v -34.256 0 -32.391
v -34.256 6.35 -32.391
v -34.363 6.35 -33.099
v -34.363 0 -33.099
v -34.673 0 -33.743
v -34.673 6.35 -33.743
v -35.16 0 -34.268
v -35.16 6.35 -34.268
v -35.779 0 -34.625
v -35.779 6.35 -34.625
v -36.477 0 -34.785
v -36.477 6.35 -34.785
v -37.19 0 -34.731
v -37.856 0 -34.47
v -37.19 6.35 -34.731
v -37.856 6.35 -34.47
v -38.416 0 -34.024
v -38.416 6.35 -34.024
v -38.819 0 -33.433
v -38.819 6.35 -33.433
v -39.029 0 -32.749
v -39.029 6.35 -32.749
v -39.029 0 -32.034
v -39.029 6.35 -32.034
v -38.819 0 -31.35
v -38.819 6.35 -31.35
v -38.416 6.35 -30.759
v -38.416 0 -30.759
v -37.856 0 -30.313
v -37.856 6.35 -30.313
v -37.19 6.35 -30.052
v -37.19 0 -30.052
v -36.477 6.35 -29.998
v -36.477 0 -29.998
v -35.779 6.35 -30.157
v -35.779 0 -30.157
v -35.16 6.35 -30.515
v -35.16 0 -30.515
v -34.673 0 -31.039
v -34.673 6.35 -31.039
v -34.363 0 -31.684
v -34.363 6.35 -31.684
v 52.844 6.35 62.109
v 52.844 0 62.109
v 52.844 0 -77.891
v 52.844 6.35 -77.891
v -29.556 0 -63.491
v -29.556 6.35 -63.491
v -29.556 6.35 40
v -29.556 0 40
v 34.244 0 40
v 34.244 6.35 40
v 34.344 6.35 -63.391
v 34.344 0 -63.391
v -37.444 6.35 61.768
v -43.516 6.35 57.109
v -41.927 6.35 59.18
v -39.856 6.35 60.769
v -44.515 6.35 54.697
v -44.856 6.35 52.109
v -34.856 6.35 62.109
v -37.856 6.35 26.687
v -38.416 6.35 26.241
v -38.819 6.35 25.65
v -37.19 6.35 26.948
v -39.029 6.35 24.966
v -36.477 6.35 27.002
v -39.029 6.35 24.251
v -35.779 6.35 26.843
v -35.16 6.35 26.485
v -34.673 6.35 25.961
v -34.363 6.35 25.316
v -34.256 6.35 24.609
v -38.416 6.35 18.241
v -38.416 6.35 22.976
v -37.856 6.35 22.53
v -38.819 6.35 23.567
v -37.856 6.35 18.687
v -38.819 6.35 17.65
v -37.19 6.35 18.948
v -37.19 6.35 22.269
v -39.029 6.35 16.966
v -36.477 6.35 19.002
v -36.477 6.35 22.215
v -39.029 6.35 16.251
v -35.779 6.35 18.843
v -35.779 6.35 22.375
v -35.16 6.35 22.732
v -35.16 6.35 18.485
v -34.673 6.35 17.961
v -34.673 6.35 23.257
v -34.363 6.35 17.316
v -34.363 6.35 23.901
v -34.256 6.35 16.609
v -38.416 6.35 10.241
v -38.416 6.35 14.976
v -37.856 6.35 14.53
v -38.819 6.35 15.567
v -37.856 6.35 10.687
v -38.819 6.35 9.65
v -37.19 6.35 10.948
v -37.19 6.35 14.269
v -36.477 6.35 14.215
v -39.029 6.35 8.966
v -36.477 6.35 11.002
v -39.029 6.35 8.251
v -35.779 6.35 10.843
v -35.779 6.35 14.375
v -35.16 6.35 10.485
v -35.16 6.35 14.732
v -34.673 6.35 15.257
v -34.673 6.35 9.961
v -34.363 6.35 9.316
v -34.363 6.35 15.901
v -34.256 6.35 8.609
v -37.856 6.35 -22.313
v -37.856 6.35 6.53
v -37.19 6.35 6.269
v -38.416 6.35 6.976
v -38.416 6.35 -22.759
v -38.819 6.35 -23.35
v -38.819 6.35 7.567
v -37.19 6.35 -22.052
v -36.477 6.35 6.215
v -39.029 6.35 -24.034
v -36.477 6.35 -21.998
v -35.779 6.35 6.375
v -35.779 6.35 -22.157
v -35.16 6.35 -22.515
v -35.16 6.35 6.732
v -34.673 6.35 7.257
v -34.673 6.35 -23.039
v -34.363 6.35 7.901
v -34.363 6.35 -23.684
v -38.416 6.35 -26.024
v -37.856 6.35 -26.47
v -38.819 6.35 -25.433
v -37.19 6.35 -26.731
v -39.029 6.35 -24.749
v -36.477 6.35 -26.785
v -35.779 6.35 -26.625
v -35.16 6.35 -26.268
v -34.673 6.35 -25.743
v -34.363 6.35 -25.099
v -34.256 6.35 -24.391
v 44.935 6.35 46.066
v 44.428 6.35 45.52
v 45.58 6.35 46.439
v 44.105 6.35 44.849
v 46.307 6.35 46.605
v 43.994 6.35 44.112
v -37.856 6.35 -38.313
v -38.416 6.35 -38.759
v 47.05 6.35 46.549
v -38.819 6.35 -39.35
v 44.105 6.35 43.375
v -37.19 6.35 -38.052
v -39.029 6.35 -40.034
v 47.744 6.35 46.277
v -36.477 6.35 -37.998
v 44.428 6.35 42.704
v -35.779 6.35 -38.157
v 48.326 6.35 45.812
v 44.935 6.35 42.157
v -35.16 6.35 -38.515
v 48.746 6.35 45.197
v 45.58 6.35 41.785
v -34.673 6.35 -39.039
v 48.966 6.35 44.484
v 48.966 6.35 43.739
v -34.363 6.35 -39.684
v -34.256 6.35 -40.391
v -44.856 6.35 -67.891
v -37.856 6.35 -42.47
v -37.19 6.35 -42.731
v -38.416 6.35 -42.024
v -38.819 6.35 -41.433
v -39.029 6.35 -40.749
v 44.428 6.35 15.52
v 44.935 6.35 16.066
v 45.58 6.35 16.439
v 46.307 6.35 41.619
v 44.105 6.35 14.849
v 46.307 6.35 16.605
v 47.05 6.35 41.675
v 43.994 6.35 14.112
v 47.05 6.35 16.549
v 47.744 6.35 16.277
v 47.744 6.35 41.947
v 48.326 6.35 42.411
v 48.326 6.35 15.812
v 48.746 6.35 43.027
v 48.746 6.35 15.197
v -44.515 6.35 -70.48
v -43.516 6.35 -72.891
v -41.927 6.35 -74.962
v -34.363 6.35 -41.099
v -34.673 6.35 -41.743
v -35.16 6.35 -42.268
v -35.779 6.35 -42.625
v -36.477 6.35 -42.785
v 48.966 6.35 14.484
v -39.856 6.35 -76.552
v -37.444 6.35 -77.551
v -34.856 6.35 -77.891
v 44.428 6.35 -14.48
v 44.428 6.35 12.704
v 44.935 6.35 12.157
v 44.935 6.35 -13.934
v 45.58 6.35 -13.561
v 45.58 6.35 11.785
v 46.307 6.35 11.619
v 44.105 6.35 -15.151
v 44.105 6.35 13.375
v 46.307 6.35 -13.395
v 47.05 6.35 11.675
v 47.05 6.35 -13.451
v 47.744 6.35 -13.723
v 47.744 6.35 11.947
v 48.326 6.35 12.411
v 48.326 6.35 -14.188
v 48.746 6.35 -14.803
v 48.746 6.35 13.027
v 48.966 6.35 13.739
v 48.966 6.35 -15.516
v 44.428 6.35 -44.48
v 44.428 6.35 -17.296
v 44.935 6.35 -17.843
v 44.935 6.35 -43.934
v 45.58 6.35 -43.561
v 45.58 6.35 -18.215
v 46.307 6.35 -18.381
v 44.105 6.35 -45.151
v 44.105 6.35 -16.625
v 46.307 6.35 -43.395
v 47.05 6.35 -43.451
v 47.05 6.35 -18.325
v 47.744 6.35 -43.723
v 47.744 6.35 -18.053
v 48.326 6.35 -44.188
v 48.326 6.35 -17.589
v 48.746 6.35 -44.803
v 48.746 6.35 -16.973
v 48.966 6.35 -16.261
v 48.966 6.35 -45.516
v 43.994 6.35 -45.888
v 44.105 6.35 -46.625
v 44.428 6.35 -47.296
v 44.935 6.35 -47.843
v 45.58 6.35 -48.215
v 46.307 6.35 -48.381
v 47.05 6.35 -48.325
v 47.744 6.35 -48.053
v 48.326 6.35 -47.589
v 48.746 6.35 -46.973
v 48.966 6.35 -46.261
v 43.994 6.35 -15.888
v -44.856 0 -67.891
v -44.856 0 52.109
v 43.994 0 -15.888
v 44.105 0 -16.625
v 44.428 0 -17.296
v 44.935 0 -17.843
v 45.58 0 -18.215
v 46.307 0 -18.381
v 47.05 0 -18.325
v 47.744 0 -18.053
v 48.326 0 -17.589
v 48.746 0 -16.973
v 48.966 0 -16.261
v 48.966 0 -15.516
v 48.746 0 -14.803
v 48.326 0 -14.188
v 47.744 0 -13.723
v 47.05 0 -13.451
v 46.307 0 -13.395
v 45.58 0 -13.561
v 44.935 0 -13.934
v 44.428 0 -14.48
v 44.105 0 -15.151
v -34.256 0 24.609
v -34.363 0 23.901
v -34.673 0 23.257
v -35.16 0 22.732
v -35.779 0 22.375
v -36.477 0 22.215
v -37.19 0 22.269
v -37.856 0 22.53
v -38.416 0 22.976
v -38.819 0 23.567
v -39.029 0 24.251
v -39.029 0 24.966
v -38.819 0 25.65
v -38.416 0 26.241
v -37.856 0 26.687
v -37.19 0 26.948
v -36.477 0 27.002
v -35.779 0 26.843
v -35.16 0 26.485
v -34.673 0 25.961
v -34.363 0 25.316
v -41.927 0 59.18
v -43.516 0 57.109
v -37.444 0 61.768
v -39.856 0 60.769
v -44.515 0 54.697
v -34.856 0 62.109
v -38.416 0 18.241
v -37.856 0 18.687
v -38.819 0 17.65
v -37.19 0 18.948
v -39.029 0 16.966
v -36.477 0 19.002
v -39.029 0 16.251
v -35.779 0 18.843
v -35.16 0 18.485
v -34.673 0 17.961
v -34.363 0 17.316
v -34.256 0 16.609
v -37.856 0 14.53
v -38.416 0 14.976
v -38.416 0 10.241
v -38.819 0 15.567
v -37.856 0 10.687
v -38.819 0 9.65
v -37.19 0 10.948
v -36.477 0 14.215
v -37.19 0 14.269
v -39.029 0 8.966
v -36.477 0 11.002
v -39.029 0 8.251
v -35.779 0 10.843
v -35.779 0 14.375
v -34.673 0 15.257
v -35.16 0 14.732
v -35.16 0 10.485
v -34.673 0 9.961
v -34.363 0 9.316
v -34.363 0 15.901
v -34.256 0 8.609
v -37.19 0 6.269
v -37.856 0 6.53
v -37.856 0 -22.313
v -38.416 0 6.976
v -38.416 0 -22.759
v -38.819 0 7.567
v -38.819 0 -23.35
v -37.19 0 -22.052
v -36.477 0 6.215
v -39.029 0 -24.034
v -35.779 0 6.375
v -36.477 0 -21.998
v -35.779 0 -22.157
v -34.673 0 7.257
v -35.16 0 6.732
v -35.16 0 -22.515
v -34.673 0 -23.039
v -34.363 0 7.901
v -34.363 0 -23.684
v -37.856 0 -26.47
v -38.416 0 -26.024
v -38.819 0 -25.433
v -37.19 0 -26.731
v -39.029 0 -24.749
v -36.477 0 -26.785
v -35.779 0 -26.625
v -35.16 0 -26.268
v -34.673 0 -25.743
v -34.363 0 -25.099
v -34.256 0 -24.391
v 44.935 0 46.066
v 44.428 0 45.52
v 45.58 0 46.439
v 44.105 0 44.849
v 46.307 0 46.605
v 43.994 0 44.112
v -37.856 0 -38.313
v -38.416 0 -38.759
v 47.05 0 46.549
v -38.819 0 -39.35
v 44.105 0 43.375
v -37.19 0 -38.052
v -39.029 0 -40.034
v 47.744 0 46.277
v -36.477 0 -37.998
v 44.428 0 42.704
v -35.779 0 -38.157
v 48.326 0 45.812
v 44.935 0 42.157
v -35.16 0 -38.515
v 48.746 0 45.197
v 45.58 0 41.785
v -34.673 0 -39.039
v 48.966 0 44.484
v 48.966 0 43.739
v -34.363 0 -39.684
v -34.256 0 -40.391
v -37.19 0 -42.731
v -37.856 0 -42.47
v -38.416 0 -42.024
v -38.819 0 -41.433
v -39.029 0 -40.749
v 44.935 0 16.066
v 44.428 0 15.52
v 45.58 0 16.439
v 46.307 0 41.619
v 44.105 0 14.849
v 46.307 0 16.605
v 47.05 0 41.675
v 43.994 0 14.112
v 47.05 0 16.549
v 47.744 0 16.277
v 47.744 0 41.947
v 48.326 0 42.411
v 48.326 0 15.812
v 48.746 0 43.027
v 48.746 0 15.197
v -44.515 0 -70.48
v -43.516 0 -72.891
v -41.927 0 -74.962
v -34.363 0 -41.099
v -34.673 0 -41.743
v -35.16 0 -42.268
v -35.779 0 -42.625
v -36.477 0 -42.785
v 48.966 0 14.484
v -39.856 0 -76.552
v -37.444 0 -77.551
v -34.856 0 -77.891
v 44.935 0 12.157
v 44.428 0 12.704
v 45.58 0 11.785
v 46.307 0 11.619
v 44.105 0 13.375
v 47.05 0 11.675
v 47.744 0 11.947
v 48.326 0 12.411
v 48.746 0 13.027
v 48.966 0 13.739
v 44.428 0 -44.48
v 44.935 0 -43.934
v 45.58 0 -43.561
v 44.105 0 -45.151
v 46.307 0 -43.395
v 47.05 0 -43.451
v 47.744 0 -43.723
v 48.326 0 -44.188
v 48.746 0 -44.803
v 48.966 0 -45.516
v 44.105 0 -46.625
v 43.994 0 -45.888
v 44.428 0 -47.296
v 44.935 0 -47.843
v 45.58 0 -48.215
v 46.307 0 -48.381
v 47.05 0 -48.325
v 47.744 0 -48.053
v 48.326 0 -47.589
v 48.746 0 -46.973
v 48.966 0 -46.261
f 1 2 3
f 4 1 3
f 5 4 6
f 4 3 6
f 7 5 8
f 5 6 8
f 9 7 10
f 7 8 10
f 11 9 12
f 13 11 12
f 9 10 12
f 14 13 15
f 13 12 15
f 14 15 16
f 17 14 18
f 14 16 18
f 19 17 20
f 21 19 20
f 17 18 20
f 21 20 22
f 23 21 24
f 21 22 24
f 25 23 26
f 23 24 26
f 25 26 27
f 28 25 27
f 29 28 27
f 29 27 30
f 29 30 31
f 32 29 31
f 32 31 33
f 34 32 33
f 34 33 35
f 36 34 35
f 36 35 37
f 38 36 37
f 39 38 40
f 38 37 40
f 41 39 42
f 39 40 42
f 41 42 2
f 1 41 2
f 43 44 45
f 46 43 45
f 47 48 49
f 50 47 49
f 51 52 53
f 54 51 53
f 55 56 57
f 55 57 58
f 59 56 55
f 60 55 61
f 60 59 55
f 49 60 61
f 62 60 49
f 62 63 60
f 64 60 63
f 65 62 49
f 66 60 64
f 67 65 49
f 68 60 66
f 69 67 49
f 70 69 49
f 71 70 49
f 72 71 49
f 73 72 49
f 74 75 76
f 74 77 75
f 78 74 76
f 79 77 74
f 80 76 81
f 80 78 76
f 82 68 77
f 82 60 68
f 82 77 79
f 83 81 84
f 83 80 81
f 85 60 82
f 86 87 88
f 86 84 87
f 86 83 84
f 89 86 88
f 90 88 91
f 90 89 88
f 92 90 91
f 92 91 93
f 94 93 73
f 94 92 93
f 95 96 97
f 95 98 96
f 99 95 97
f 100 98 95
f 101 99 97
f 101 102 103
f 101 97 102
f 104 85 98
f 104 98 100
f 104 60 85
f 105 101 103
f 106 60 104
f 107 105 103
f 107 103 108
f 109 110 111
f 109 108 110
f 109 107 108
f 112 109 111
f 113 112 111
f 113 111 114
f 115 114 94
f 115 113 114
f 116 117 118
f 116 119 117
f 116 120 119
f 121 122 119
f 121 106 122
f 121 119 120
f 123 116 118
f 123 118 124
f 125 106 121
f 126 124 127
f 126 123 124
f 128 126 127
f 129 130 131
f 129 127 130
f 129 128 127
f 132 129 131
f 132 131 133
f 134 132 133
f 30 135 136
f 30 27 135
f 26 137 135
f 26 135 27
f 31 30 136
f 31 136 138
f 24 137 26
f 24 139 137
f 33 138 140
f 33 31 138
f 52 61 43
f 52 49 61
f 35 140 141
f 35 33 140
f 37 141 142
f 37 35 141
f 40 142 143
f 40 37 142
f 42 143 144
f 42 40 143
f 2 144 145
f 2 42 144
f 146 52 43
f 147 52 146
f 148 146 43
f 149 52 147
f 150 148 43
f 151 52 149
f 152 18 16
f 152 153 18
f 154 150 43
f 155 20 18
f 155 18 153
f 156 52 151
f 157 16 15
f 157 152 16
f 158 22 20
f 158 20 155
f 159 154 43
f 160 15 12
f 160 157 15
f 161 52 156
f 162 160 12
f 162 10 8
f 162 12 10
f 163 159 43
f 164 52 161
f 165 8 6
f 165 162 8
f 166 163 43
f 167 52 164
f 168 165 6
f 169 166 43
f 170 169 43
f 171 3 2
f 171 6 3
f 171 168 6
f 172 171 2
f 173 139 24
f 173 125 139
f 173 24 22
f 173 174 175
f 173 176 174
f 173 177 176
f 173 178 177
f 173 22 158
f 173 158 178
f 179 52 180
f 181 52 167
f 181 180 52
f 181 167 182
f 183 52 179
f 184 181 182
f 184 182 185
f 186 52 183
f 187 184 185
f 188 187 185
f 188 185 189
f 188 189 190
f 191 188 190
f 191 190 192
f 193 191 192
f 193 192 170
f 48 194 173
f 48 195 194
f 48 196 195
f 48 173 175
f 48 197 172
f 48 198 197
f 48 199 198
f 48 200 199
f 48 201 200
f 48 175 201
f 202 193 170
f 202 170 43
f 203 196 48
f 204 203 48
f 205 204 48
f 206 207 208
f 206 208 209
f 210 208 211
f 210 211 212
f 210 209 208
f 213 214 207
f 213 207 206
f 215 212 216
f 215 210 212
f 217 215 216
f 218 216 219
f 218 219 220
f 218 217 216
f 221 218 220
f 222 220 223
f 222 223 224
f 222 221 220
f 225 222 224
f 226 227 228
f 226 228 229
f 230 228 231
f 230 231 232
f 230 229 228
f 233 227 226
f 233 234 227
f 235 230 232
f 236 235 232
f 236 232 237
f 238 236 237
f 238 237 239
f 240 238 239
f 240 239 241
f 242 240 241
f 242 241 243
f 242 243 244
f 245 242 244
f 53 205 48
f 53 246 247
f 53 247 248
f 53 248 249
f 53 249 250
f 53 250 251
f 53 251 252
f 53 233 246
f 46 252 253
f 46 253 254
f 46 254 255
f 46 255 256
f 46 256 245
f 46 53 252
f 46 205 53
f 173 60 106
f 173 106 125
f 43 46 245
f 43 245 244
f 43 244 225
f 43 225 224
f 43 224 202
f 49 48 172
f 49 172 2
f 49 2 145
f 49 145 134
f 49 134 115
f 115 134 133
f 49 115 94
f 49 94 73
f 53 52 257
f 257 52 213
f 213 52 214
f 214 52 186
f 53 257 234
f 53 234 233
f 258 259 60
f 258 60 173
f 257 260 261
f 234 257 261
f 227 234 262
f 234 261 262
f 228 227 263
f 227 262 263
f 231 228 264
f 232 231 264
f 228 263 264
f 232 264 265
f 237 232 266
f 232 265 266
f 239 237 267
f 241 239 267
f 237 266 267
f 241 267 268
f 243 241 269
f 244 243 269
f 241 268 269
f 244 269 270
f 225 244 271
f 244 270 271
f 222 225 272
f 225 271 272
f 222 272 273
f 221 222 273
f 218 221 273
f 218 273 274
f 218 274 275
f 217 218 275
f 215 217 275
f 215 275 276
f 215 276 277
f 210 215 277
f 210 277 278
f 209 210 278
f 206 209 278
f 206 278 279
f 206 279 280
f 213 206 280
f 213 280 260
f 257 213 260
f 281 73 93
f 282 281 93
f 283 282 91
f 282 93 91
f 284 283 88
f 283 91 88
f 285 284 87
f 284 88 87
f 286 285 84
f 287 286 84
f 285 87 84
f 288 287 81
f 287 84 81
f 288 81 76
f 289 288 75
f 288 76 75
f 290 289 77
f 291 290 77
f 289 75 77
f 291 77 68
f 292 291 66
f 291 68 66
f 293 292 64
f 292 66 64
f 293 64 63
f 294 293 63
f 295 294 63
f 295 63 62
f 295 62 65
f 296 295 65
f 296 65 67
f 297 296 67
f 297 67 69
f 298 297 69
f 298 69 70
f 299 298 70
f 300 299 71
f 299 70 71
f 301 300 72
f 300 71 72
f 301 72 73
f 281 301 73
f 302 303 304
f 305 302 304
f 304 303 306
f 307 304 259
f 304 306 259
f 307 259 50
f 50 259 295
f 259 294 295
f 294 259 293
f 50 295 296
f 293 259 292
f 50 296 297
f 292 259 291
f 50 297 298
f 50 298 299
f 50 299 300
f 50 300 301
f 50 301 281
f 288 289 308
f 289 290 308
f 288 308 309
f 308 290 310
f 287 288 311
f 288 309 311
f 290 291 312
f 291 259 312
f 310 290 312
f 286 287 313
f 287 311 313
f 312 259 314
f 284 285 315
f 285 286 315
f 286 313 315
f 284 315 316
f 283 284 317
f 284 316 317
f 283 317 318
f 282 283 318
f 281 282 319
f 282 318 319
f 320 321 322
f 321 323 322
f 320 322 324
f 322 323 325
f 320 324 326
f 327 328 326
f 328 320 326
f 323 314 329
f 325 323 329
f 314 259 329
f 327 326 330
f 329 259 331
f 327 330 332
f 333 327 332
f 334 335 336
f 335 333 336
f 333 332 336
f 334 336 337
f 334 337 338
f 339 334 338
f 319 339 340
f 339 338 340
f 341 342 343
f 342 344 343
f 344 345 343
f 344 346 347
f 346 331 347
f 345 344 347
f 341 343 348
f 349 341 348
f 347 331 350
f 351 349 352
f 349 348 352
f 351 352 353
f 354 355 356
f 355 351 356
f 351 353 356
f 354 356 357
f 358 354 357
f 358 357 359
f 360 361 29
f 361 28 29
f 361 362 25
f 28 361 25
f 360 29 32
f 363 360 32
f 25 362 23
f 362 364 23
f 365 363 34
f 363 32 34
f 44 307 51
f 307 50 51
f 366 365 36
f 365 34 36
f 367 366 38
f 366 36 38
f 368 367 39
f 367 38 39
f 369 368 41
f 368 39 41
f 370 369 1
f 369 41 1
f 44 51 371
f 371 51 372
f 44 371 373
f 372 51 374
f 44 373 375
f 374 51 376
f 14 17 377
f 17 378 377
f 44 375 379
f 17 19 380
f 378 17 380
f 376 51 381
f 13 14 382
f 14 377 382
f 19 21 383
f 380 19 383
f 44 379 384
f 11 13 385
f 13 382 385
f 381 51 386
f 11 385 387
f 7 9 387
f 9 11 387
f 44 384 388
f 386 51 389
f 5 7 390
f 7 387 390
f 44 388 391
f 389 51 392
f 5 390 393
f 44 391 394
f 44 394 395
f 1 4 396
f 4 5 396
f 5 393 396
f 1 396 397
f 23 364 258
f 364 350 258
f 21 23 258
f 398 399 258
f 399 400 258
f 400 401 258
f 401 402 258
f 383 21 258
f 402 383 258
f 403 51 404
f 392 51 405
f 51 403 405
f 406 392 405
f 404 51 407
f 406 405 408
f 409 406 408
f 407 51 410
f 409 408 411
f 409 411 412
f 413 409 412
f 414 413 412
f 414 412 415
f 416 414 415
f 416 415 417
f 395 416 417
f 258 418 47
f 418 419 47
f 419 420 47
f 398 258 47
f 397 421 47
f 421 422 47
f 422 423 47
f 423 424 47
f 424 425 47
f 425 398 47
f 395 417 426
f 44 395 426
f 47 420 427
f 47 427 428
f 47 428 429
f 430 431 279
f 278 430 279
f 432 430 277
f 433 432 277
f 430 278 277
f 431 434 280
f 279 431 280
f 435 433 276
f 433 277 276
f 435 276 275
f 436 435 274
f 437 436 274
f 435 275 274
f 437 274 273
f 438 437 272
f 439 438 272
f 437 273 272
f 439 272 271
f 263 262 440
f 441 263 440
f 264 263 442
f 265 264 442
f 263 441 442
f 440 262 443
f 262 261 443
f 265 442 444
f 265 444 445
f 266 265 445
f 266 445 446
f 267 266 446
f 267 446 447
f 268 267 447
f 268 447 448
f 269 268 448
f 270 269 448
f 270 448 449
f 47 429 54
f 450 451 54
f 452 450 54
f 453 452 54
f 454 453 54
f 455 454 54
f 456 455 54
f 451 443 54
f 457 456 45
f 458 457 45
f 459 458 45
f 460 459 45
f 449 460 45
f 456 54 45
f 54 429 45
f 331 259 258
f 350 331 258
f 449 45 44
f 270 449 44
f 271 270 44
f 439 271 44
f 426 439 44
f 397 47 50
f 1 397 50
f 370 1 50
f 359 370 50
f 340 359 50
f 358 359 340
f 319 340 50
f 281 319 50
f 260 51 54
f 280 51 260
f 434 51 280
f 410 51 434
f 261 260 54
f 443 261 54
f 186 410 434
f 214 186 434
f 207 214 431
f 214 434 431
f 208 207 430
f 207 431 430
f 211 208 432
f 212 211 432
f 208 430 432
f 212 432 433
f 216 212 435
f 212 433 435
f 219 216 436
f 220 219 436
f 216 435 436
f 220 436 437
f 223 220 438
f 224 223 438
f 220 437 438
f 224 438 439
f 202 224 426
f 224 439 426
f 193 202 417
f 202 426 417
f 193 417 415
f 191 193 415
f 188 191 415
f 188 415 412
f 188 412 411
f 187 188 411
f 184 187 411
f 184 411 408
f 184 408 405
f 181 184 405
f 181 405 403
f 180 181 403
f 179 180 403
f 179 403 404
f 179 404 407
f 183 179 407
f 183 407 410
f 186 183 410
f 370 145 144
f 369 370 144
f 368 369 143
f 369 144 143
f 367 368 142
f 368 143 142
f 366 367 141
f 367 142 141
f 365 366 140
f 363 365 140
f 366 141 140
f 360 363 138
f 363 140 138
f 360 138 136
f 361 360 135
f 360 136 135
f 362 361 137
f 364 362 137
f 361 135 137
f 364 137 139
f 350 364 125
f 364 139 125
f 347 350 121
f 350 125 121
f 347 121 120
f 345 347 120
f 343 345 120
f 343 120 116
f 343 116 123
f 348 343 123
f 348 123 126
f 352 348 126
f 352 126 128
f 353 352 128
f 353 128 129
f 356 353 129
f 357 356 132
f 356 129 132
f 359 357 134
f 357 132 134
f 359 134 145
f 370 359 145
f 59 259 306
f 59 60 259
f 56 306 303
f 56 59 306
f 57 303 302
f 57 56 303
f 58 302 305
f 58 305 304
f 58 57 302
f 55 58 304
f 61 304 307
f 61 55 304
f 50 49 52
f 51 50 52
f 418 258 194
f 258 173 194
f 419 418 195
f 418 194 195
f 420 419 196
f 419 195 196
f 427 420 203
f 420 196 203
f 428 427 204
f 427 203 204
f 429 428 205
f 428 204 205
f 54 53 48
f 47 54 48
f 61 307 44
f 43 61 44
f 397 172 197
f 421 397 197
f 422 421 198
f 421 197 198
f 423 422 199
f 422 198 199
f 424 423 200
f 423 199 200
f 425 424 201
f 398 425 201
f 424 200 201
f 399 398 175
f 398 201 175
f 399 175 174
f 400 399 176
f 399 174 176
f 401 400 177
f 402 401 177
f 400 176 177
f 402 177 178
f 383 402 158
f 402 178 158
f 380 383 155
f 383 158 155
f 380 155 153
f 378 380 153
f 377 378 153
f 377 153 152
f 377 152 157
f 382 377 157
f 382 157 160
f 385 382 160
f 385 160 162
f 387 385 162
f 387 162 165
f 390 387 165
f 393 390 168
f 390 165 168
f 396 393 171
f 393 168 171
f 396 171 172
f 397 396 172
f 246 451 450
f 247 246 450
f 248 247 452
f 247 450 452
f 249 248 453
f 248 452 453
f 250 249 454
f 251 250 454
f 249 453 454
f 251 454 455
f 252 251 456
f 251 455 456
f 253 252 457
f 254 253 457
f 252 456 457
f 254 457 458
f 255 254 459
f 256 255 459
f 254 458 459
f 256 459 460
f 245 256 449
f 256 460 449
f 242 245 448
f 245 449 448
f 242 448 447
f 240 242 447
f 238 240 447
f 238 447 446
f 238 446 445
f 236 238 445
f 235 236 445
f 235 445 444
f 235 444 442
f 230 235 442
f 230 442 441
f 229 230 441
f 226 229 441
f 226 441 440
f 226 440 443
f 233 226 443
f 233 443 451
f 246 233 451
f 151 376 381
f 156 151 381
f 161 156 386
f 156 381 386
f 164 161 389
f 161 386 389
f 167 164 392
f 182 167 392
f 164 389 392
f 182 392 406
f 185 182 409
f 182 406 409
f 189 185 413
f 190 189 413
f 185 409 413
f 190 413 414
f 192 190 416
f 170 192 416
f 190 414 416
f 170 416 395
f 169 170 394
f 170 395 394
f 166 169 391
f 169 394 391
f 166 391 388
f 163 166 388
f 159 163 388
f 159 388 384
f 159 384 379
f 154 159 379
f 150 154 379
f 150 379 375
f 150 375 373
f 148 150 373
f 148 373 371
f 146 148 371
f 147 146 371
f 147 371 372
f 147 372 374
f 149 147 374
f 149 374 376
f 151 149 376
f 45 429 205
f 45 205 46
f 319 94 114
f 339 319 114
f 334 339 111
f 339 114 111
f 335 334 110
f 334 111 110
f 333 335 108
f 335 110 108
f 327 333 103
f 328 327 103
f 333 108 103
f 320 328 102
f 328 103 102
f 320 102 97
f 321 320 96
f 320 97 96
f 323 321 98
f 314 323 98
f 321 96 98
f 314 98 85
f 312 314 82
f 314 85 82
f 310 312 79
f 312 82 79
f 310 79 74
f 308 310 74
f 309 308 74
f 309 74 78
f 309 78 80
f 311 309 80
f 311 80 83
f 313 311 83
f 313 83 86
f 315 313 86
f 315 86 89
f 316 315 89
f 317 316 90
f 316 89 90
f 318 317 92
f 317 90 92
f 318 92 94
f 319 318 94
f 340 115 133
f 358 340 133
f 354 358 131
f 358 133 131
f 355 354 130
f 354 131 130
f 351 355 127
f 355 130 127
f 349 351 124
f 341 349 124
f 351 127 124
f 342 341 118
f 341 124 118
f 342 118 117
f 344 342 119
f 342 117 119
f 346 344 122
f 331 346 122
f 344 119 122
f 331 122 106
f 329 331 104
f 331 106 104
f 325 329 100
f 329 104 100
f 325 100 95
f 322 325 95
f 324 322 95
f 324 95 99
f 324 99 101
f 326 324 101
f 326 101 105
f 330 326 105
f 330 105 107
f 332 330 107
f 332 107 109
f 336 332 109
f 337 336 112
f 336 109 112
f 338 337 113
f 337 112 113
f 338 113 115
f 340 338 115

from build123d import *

# Parameters (mm, degrees)
SKETCH1_W                 = 97.7
SKETCH1_H                 = 140
BOSS_EXTRUDE1_DEPTH       = 6.35
FILLET1_R                 = 10
CUT_EXTRUDE1_DEPTH        = 6.35
SKETCH5_R                 = 2.4
CUT_EXTRUDE2_DEPTH        = 6.35
F_5_0MM_DOWEL_HOLE1_D     = 5
F_5_0MM_DOWEL_HOLE1_DEPTH = 10
F_5_0MM_DOWEL_HOLE1_TIP   = 1.502151548


with BuildPart() as part:
    # Sketch1 → Boss-Extrude1 (new body)
    with BuildSketch(Plane(origin=(0, 0, 0), x_dir=(1, 0, 0), z_dir=(0, 1, 0))):
        with Locations((3.993769968, 7.891373802)):
            Rectangle(SKETCH1_W, SKETCH1_H)
    extrude(amount=BOSS_EXTRUDE1_DEPTH)

    # Fillet1
    fillet1_edges = [part.edges().sort_by_distance(p)[0] for p in [
        (-44.856230032, 3.175, -77.891373802),
        (-44.856230032, 3.175, 62.108626198),
    ]]
    fillet(fillet1_edges, radius=FILLET1_R)

    # Sketch3 → Cut-Extrude1 (cut)
    with BuildSketch(Plane(origin=(0, 6.35, 0), x_dir=(1, 0, 0), z_dir=(0, 1, 0))):
        Polygon((-29.556230032, 63.491373802), (-29.556230032, -40), (34.243769968, -40), (34.343769968, 63.391373802), align=None)
    extrude(amount=-CUT_EXTRUDE1_DEPTH, mode=Mode.SUBTRACT)

    # Sketch5 → Cut-Extrude2 (cut)
    with BuildSketch(Plane(origin=(0, 6.35, 0), x_dir=(1, 0, 0), z_dir=(0, 1, 0))):
        with Locations((-36.656230032, 40.391373802)):
            Circle(SKETCH5_R)
        with Locations((-36.656230032, 24.391373802)):
            Circle(SKETCH5_R)
        with Locations((-36.656230032, -8.608626198)):
            Circle(SKETCH5_R)
        with Locations((-36.656230032, -24.608626198)):
            Circle(SKETCH5_R)
        with Locations((-36.656230032, -16.608626198)):
            Circle(SKETCH5_R)
        with Locations((-36.656230032, 32.391373802)):
            Circle(SKETCH5_R)
    extrude(amount=-CUT_EXTRUDE2_DEPTH, mode=Mode.SUBTRACT)

    # Ø5.0mm Dowel Hole1
    with Locations(Plane(origin=(0, 6.35, 0), x_dir=(1, 0, 0), z_dir=(0, 1, 0))):
        with Locations((46.493769968, 45.888131535), (46.493769968, 15.888131535), (46.493769968, -14.111868465), (46.493769968, -44.111868465)):
            Hole(F_5_0MM_DOWEL_HOLE1_D / 2, depth=F_5_0MM_DOWEL_HOLE1_DEPTH)
            with Locations((0, 0, -(F_5_0MM_DOWEL_HOLE1_DEPTH + F_5_0MM_DOWEL_HOLE1_TIP / 2))):  # 118° drill point
                Cone(0, F_5_0MM_DOWEL_HOLE1_D / 2, F_5_0MM_DOWEL_HOLE1_TIP, mode=Mode.SUBTRACT)


solid = part.part
